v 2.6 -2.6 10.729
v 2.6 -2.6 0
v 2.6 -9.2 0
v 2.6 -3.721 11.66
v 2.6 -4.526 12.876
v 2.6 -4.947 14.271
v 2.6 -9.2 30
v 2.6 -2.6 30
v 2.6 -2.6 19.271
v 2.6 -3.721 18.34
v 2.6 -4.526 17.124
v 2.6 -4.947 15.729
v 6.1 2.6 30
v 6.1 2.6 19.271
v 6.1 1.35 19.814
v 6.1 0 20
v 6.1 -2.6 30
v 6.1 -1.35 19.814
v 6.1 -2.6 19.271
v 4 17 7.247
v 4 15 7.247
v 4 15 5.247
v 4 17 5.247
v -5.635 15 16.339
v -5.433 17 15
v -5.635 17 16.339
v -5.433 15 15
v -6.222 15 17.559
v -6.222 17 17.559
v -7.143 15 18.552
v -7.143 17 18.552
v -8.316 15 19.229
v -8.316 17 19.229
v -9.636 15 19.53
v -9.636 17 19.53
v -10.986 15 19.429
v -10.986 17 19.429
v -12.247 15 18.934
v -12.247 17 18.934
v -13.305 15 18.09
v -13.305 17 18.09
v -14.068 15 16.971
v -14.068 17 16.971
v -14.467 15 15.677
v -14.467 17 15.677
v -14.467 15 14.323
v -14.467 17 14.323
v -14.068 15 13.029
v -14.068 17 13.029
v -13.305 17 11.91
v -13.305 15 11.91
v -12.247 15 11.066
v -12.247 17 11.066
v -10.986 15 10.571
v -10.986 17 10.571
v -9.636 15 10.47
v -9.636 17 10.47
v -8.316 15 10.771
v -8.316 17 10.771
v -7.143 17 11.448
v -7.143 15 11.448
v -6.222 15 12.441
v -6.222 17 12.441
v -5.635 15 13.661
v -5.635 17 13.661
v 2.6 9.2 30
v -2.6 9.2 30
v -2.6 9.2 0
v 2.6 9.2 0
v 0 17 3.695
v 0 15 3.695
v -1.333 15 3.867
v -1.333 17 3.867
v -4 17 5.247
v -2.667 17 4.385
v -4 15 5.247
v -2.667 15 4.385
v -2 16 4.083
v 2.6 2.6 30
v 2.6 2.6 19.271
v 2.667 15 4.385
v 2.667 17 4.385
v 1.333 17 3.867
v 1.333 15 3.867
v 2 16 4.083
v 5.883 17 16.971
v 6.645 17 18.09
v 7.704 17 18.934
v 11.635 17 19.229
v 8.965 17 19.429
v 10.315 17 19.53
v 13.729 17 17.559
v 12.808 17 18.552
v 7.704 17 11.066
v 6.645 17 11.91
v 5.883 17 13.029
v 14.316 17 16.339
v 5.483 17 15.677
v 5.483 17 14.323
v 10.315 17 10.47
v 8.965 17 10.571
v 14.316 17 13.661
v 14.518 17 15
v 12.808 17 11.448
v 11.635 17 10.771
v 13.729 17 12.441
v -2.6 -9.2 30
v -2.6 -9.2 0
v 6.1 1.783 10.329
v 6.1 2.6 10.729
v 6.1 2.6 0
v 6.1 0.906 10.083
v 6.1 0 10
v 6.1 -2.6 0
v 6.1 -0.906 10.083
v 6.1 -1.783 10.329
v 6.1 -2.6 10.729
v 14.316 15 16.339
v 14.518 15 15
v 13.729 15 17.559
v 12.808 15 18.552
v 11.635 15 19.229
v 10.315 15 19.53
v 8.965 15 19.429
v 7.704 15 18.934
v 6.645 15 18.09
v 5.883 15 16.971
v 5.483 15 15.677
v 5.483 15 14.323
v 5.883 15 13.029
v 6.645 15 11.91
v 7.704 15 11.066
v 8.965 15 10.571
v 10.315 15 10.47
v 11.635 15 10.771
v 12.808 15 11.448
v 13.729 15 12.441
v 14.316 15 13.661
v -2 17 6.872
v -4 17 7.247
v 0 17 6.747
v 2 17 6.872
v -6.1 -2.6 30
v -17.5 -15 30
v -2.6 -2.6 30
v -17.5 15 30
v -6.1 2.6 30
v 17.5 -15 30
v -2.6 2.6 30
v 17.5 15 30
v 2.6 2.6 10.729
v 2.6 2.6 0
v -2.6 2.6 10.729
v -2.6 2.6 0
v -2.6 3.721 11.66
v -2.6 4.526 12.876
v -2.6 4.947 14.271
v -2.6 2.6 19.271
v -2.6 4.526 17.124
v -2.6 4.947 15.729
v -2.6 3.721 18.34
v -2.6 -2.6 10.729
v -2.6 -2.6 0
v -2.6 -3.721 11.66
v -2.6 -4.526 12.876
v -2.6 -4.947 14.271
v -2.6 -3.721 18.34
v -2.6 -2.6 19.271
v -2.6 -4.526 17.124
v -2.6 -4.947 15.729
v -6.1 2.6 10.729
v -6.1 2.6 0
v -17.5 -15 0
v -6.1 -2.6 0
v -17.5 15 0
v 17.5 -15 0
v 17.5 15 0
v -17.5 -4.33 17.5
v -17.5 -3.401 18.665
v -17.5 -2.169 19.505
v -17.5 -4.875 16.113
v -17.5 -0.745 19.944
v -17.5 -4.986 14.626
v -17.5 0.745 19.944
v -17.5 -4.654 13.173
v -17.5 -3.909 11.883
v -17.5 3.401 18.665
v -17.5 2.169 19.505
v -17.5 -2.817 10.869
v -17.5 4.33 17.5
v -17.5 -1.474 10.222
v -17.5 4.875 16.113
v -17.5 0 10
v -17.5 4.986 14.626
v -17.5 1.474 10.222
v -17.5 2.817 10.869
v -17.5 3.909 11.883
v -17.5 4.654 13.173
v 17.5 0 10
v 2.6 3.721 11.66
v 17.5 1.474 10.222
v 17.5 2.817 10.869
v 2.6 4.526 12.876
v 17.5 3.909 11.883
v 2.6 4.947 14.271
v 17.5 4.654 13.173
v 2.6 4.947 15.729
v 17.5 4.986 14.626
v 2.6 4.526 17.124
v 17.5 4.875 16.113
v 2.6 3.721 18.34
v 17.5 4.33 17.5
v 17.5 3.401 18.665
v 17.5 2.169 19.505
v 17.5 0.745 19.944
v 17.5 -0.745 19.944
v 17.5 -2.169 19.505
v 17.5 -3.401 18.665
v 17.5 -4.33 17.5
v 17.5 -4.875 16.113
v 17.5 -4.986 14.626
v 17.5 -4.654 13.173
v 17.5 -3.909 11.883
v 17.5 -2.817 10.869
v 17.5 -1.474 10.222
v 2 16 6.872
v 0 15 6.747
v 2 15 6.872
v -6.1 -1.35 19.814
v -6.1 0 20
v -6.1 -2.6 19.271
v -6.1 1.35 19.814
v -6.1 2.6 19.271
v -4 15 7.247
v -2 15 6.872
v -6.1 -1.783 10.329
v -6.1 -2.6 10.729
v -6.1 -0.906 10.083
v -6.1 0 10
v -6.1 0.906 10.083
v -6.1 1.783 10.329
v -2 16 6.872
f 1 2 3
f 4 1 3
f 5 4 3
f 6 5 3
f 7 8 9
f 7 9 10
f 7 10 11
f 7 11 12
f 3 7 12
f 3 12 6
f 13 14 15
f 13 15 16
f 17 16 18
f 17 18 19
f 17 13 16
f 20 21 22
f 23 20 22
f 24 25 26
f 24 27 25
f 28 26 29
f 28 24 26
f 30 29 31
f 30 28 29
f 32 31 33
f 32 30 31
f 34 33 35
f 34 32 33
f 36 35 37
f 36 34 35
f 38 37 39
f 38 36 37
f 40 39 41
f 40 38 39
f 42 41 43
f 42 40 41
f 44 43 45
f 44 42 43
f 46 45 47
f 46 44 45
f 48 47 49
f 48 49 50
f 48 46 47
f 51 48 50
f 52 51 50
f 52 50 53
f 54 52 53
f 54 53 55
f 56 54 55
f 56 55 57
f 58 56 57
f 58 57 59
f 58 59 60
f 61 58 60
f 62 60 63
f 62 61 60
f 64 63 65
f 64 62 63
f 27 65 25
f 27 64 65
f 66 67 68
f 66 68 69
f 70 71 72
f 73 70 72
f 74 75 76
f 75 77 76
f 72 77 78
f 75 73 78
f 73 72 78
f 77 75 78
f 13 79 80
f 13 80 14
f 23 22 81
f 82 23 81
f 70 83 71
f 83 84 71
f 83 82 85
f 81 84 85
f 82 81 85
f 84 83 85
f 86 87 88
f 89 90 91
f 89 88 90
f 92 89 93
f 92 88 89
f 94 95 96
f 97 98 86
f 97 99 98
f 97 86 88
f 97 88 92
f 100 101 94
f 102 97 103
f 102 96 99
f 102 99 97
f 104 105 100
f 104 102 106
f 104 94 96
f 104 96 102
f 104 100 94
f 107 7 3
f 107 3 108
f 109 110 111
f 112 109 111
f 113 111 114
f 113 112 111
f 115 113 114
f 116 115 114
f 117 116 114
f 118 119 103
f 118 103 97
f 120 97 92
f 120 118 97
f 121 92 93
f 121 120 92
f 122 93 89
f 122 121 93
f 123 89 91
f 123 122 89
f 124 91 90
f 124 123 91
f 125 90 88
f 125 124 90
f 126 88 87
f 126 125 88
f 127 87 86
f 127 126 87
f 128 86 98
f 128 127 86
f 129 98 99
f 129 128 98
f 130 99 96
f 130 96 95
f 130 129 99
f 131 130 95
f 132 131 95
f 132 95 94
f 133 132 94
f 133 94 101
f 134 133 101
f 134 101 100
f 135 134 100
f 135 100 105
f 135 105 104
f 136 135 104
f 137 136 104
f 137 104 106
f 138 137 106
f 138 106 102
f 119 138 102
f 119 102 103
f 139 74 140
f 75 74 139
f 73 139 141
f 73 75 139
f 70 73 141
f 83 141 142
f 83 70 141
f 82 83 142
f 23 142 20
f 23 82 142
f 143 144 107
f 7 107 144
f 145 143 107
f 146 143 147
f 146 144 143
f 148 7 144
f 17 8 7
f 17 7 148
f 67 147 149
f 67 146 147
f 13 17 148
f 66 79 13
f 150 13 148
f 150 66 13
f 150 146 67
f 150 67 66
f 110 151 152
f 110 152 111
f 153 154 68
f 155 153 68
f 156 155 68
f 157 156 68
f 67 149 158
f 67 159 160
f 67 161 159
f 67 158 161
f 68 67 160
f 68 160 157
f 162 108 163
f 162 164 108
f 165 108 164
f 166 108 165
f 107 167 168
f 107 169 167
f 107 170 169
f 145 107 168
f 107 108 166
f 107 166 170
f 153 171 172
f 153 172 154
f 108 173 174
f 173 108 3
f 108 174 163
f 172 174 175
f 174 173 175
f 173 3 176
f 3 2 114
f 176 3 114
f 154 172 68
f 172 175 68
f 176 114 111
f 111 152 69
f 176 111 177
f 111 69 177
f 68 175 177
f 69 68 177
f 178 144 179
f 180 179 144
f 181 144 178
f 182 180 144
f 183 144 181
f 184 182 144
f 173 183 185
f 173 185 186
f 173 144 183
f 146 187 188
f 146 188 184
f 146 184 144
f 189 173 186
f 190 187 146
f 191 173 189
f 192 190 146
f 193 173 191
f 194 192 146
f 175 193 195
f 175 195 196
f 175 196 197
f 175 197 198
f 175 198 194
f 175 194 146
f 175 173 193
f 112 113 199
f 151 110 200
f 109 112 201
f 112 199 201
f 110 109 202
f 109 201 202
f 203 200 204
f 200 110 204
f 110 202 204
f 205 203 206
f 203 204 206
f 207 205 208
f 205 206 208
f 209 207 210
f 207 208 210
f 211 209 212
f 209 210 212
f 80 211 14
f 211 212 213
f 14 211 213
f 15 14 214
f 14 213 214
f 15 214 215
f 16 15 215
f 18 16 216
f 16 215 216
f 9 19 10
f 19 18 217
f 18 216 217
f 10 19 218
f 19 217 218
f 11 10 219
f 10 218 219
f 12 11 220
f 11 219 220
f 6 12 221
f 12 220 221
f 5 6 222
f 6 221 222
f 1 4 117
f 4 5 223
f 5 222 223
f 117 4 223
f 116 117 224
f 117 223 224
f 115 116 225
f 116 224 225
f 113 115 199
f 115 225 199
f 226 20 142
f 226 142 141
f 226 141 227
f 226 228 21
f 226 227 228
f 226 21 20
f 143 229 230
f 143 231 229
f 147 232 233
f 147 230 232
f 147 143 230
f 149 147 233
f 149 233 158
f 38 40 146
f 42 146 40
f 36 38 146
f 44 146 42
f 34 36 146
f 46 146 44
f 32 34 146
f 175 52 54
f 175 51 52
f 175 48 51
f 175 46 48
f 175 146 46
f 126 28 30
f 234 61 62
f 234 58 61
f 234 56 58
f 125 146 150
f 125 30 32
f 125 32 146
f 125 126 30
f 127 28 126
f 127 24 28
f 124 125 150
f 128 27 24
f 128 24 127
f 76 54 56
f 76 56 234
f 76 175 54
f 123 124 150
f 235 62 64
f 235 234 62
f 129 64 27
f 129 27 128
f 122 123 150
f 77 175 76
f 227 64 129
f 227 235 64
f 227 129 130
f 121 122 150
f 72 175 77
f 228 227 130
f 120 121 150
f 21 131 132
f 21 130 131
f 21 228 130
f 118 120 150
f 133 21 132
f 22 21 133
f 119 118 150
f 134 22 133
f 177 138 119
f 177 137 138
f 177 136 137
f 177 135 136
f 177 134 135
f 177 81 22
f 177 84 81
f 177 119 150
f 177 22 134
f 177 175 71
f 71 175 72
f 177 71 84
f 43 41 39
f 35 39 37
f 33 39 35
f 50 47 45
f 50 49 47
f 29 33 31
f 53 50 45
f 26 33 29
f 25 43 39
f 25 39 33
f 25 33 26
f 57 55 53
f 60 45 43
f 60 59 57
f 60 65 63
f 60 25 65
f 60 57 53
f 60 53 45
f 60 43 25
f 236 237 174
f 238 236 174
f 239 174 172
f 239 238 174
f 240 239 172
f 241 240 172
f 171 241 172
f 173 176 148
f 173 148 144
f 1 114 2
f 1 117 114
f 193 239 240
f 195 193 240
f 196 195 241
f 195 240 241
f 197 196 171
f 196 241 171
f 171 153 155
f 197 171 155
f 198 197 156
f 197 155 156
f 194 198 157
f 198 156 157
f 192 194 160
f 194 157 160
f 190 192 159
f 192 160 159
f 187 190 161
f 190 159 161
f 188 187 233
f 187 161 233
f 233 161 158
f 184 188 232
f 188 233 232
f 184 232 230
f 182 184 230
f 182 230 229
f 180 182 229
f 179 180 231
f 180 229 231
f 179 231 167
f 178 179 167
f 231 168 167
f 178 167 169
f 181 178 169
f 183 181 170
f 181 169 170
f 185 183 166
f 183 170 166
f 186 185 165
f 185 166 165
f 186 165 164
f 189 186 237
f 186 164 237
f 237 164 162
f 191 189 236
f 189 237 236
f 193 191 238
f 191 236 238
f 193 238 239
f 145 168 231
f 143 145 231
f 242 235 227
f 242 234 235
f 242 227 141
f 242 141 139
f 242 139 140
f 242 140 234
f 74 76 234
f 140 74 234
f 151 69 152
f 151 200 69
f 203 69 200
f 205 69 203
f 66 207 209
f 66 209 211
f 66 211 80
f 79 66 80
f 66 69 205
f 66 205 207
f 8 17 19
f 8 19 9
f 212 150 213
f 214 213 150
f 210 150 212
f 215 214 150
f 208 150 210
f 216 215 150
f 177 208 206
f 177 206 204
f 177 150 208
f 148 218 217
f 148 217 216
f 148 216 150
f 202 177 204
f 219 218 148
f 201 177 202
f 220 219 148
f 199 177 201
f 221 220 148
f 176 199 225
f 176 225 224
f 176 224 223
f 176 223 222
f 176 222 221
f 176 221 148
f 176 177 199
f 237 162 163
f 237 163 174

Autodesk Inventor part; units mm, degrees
ref_plane "YZ Plane" through (0, 0, 0) normal (1, 0, 0) x (0, 1, 0)
ref_plane "XZ Plane" through (0, 0, 0) normal (0, 1, 0) x (-1, 0, 0)
ref_plane "XY Plane" through (0, 0, 0) normal (0, 0, 1) x (1, 0, 0)
sketch "スケッチ1" plane through (0, 0, 0) normal (0, 0, 1) x (1, 0, 0)
  line L0 (40.6372, 0) -> (-44.8968, 0)
  line L1 (0, -28.7297) -> (0, 26.7749)
  line L2 (17.5, -15) -> (-17.5, -15)
  line L3 (-17.5, -15) -> (-17.5, 15)
  line L4 (-17.5, 15) -> (17.5, 15)
  line L5 (17.5, 15) -> (17.5, -15)
  point P0 (0, 0)
  dimension "d0" = 35
  dimension "d1" = 30
extrude "押し出し1" add sketch "スケッチ1" along normal blind 30
sketch "スケッチ4" plane through (17.5, -15, 0) normal (1, 0, 0) x (0, 0, -1)
  line L0 (0, 30) -> (0, 0) projected
  line L1 (0, 30) -> (-30, 30) projected
  line L2 (-30, 0) -> (-30, 30) projected
  line L3 (0, 0) -> (-30, 0) projected
  line L4 (-30, 15) -> (0, 15)
  line L5 (0, 30) -> (-30, 30) projected
  line L6 (-15, 30) -> (-15, 0)
  circle A0 centre (-15, 15) radius 5
  dimension "d4" = 10
extrude "押し出し2" cut sketch "スケッチ4" against normal through all contours A0 L6 L4 | L4 L6 A0 | L6 L4 A0 | L6 A0 L4
sketch "スケッチ5" plane through (0, 0, 30) normal (0, 0, 1) x (1, 0, 0)
  line L0 (-5.9, -2.4) -> (-5.9, 2.4) projected
  line L1 (-2.4, -2.4) -> (-5.9, -2.4) projected
  line L2 (-2.4, -9) -> (-2.4, -2.4) projected
  line L3 (2.4, -9) -> (-2.4, -9) projected
  line L4 (2.4, -2.4) -> (2.4, -9) projected
  line L5 (5.9, -2.4) -> (2.4, -2.4) projected
  line L6 (5.9, 2.4) -> (5.9, -2.4) projected
  line L7 (2.4, 2.4) -> (5.9, 2.4) projected
  line L8 (2.4, 9) -> (2.4, 2.4) projected
  line L9 (-2.4, 9) -> (2.4, 9) projected
  line L10 (-2.4, 2.4) -> (-2.4, 9) projected
  line L11 (-5.9, 2.4) -> (-2.4, 2.4) projected
  ellipse E0 centre (0.5, 0) end of major axis (4.0355, 0) minor radius 2.5 (0, -2.4749) -> (0, 2.4749) ccw projected
  ellipse E1 centre (-0.5, 0) end of major axis (-4.0355, 0) minor radius 2.5 (0, 2.4749) -> (0, -2.4749) ccw projected
  line L12 (-2.6, 9.2) -> (2.6, 9.2)
  line L13 (2.6, 9.2) -> (2.6, 2.6)
  line L14 (2.6, 2.6) -> (6.1, 2.6)
  line L15 (6.1, 2.6) -> (6.1, -2.6)
  line L16 (6.1, -2.6) -> (2.6, -2.6)
  line L17 (2.6, -2.6) -> (2.6, -9.2)
  line L18 (2.6, -9.2) -> (-2.6, -9.2)
  line L19 (-2.6, -9.2) -> (-2.6, -2.6)
  line L20 (-2.6, -2.6) -> (-6.1, -2.6)
  line L21 (-6.1, -2.6) -> (-6.1, 2.6)
  line L22 (-6.1, 2.6) -> (-2.6, 2.6)
  line L23 (-2.6, 2.6) -> (-2.6, 9.2)
  point P0 (0, 0)
  dimension "d9" = 0.2
extrude "押し出し3" cut sketch "スケッチ5" against normal up to surface (30 mm away) contours L0 L11 L10 L9 L8 L7 L6 L5 L4 L3 L2 L1 | E1 E0 | L12 L13 L14 L15 L16 L17 L18 L19 L20 L21 L22 L23
sketch "スケッチ6" plane through (-17.5, 15, 0) normal (0, 1, 0) x (1, 0, 0)
  line L0 (0, 0) -> (35, 0) projected
  line L1 (0, 0) -> (0, -30) projected
  line L2 (35, -30) -> (0, -30) projected
  line L3 (35, 0) -> (35, -30) projected
  line L4 (35, -10) -> (35, -20) projected
  line L5 (35, -15) -> (0, -15)
  line L6 (0, -30) -> (35, -30) projected
  line L7 (17.5, -30) -> (17.5, 0)
  circle A0 centre (7.5246, -15) radius 4.5427
  line L8 (21.5, -7.2467) -> (17.5, -6.2467) construction
  line L9 (17.5, -6.2467) -> (13.5, -7.2467) construction
  spline S0 degree 2 poles (21.5, -7.2467) (17.5, -6.2467) (13.5, -7.2467) knots 1 1 1 2 2 2
  line L10 (21.5, -7.2467) -> (21.5, -5.2467)
  line L11 (21.5, -5.2467) -> (17.5, -2.1432) construction
  line L12 (17.5, -2.1432) -> (13.5, -5.2467) construction
  spline S1 degree 2 poles (21.5, -5.2467) (17.5, -2.1432) (13.5, -5.2467) knots 1 1 1 2 2 2
  line L13 (13.5, -5.2467) -> (13.5, -7.2467)
  circle A1 centre (27.4754, -15) radius 4.5427
  line L14 (13.5, -7.2467) -> (29.7216, -7.2467)
  line L15 (13.5, -5.2467) -> (30.3964, -5.2467)
  dimension "d12" = 2
  dimension "d13" = 4
  dimension "d14" = 4
extrude "顔" add sketch "スケッチ6" along normal blind 2 contours S1 L15 L7 | L7 L15 S1 | A0 L5 | L5 A0 | L15 L10 S0 L7 | L7 S0 L13 L15 | A1 L5 | L5 A1
equation "\"d14\" = d13"
properties part number "head"
